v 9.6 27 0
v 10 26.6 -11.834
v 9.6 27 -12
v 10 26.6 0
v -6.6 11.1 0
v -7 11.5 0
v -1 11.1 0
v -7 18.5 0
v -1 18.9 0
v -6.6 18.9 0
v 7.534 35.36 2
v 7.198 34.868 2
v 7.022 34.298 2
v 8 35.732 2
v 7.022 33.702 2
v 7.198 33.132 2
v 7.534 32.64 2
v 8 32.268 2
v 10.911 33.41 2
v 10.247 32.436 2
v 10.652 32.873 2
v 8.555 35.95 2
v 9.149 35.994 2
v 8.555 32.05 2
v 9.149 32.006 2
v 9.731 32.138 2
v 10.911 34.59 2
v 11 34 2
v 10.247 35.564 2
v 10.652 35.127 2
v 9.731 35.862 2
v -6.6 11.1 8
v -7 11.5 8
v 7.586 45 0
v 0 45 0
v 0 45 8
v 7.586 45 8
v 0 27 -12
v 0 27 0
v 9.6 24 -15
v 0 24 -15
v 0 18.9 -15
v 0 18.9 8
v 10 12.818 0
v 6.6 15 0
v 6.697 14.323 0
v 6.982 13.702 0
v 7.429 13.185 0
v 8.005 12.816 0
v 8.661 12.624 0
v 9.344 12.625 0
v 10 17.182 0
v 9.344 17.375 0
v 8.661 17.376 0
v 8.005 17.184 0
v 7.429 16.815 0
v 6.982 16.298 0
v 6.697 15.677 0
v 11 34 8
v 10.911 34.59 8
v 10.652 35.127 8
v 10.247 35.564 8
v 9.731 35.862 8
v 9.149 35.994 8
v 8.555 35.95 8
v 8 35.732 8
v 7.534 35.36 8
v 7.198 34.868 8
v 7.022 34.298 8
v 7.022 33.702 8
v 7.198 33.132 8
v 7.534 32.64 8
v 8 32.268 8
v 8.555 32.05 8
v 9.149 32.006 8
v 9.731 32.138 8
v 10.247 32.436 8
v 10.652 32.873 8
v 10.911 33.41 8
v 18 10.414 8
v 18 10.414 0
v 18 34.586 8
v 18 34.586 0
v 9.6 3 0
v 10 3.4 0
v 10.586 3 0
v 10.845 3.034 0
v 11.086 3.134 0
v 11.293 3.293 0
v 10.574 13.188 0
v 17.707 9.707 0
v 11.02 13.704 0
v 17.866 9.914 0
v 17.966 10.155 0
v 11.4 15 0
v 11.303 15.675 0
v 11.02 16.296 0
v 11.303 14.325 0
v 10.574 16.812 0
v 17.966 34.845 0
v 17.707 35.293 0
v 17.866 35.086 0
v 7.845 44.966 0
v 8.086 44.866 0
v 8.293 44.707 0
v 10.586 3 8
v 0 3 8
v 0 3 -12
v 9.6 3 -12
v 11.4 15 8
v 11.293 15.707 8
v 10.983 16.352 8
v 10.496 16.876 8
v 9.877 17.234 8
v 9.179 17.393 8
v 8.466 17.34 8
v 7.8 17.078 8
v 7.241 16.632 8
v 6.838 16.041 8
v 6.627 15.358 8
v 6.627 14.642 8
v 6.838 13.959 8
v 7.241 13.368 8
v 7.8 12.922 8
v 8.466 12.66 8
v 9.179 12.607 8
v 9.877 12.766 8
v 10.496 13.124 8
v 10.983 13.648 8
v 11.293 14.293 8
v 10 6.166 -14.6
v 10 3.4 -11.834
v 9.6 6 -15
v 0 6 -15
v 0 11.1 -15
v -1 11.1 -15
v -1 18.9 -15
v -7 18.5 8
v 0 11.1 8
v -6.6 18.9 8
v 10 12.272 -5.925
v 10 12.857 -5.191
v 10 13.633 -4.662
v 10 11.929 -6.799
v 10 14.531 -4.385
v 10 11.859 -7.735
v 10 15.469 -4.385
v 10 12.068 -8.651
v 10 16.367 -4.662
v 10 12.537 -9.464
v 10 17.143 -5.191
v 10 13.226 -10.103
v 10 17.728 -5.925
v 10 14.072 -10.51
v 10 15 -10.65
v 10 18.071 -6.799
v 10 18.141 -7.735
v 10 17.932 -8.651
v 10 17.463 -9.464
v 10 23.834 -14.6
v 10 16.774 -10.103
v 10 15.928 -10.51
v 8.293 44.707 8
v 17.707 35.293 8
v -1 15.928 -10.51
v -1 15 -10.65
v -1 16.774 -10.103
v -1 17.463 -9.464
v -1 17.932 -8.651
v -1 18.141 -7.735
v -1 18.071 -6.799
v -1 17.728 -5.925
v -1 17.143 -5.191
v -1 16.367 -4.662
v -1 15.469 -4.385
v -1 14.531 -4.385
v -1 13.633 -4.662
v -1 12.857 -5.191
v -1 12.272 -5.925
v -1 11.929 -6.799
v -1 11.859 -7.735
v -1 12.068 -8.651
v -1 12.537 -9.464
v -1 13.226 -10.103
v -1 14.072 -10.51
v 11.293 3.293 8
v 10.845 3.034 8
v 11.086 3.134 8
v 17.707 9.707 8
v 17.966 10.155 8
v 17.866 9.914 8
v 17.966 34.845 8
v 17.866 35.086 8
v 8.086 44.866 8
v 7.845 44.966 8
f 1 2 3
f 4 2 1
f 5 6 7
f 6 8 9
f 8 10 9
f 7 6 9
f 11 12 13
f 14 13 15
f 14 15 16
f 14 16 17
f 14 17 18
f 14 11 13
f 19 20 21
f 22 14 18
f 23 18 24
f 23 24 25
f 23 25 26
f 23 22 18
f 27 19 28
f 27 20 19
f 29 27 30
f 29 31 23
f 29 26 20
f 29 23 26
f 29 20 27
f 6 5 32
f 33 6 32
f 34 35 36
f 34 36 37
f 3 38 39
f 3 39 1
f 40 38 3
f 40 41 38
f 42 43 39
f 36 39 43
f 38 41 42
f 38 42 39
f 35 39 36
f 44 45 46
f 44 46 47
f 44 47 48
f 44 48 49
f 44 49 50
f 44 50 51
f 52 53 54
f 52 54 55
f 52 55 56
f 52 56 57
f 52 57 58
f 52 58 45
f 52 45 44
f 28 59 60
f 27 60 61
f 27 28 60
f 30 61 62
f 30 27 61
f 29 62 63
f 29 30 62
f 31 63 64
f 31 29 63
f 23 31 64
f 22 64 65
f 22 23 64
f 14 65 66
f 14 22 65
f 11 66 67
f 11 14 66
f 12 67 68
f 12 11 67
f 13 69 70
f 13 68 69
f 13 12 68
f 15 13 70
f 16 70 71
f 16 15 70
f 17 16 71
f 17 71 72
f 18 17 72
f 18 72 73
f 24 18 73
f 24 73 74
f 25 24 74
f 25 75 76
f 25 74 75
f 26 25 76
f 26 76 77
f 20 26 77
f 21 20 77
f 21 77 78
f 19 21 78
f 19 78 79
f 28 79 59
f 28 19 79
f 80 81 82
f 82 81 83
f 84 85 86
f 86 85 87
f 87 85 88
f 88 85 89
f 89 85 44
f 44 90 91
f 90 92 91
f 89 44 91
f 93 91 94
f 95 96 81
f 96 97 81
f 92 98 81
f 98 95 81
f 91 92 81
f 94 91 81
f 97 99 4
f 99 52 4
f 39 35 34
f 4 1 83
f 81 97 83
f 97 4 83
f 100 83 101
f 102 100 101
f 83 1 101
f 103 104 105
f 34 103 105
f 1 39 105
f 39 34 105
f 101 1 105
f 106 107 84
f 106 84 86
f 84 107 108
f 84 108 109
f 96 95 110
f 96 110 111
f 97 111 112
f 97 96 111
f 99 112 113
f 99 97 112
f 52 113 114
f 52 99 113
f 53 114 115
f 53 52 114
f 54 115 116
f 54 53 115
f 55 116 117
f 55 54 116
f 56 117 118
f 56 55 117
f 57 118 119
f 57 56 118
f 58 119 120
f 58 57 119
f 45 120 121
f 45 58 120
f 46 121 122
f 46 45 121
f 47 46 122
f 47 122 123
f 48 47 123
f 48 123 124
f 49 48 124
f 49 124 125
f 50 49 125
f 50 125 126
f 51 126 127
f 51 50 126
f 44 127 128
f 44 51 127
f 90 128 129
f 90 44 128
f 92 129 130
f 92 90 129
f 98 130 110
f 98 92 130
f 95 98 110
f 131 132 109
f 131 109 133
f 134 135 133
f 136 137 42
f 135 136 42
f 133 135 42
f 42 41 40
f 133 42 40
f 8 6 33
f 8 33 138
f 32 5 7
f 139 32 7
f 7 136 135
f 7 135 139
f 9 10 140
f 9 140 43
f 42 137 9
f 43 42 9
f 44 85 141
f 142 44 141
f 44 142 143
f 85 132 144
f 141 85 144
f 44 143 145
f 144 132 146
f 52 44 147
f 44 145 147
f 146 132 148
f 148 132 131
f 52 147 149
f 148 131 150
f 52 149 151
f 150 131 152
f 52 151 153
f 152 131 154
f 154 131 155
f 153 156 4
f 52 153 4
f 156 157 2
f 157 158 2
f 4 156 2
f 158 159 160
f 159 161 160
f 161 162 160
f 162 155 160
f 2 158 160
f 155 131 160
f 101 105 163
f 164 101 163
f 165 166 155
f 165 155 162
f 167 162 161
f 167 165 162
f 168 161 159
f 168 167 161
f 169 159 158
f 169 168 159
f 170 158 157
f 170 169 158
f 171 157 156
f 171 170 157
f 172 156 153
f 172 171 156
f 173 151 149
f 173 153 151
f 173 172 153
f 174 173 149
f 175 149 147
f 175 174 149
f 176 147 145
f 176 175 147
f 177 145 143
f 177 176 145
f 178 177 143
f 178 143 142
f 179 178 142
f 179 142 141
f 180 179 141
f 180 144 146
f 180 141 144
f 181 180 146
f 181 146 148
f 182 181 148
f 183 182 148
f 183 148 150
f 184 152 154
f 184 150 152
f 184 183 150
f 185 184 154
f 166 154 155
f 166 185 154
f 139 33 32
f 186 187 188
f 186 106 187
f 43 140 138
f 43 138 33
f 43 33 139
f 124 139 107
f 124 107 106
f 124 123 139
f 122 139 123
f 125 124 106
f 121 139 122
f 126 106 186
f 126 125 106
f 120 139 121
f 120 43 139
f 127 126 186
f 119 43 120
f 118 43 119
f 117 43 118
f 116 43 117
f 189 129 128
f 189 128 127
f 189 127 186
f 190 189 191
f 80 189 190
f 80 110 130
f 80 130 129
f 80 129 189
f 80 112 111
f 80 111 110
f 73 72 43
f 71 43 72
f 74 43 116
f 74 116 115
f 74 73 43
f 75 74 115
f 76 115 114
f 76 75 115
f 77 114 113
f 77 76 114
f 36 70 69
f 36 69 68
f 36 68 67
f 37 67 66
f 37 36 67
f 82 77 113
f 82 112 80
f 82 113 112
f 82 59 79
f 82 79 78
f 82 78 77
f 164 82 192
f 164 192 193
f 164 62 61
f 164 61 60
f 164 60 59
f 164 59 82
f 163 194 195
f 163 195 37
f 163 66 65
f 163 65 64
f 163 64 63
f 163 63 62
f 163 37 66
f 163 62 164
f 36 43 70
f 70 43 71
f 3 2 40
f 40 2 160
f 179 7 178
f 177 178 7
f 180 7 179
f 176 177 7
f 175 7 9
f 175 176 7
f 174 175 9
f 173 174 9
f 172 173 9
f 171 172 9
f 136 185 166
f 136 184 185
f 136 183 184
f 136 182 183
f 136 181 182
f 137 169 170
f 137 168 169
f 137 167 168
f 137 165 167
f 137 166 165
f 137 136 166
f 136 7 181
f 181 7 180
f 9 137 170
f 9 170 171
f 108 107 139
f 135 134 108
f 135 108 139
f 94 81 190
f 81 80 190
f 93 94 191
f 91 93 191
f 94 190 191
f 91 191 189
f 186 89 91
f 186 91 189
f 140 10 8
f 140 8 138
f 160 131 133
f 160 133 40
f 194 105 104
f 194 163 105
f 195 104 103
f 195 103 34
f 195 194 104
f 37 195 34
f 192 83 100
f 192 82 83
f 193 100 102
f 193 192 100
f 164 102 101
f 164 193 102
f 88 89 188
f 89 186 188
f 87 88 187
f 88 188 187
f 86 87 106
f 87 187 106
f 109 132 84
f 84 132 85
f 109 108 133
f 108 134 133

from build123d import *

# Parameters (mm, degrees)
CYLINDER004_R     = 2.4
CYLINDER004_DEPTH = 35
CYLINDER011_R     = 2
CYLINDER011_DEPTH = 40
CYLINDER008_R     = 3.15
CYLINDER008_DEPTH = 16
BOX006_W          = 10
BOX006_H          = 24
BOX006_DEPTH      = 15
CHAMFER004_SIZE   = 3
CHAMFER017_SIZE   = 0.4
BOX004_W          = 7
BOX004_H          = 7.8
BOX004_DEPTH      = 8
CHAMFER010_SIZE   = 0.4
BOX003_W          = 18
BOX003_H          = 42
BOX003_DEPTH      = 8
CHAMFER_SIZE      = 7
CHAMFER015_SIZE   = 10
FILLET004_R       = 1
BOX_W             = 1
BOX_H             = 7.8
BOX_DEPTH         = 15


with BuildPart() as cylinder004:
    # Cylinder004 → Cylinder004 (new body)
    with BuildSketch(Plane(origin=(9, 15, 0), x_dir=(1, 0, 0), z_dir=(0, 0, 1))):
        Circle(CYLINDER004_R)
    extrude(amount=CYLINDER004_DEPTH)


with BuildPart() as cylinder011:
    # Cylinder011 → Cylinder011 (new body)
    with BuildSketch(Plane(origin=(9, 34, 2), x_dir=(1, 0, 0), z_dir=(0, 0, 1))):
        Circle(CYLINDER011_R)
    extrude(amount=CYLINDER011_DEPTH)


with BuildPart() as cylinder008:
    # Cylinder008 → Cylinder008 (new body)
    with BuildSketch(Plane(origin=(-2, 15, -7.5), x_dir=(0, 0, -1), z_dir=(1, 0, 0))):
        Circle(CYLINDER008_R)
    extrude(amount=CYLINDER008_DEPTH)


with BuildPart() as chamfer017:
    # Box006 → Box006 (new body)
    with BuildSketch(Plane(origin=(0, 3, -15), x_dir=(1, 0, 0), z_dir=(0, 0, 1))):
        with Locations((5, 12)):
            Rectangle(BOX006_W, BOX006_H)
    extrude(amount=BOX006_DEPTH)

    # Chamfer004
    chamfer004_edges = [chamfer017.edges().sort_by_distance(p)[0] for p in [
        (5, 3, -15),
        (5, 27, -15),
    ]]
    chamfer(chamfer004_edges, length=CHAMFER004_SIZE)

    # Chamfer017
    chamfer017_edges = [chamfer017.edges().sort_by_distance(p)[0] for p in [
        (10, 3, -6),
        (10, 4.5, -13.5),
        (10, 15, -15),
        (10, 27, -6),
        (10, 25.5, -13.5),
    ]]
    chamfer(chamfer017_edges, length=CHAMFER017_SIZE)


with BuildPart() as chamfer010:
    # Box004 → Box004 (new body)
    with BuildSketch(Plane(origin=(-7, 11.1, 0), x_dir=(1, 0, 0), z_dir=(0, 0, 1))):
        with Locations((3.5, 3.9)):
            Rectangle(BOX004_W, BOX004_H)
    extrude(amount=BOX004_DEPTH)

    # Chamfer010
    chamfer010_edges = [chamfer010.edges().sort_by_distance(p)[0] for p in [
        (-7, 11.1, 4),
        (-7, 18.9, 4),
    ]]
    chamfer(chamfer010_edges, length=CHAMFER010_SIZE)


with BuildPart() as fillet004:
    # Box003 → Box003 (new body)
    with BuildSketch(Plane(origin=(0, 3, 0), x_dir=(1, 0, 0), z_dir=(0, 0, 1))):
        with Locations((9, 21)):
            Rectangle(BOX003_W, BOX003_H)
    extrude(amount=BOX003_DEPTH)

    # Chamfer
    chamfer_edges = [fillet004.edges().sort_by_distance(p)[0] for p in [
        (18, 3, 4),
    ]]
    chamfer(chamfer_edges, length=CHAMFER_SIZE)

    # Chamfer015
    chamfer015_edges = [fillet004.edges().sort_by_distance(p)[0] for p in [
        (18, 45, 4),
    ]]
    chamfer(chamfer015_edges, length=CHAMFER015_SIZE)

    # Fillet004
    fillet004_edges = [fillet004.edges().sort_by_distance(p)[0] for p in [
        (18, 35, 4),
        (18, 10, 4),
        (8, 45, 4),
        (11, 3, 4),
    ]]
    fillet(fillet004_edges, radius=FILLET004_R)


with BuildPart() as cut002002002007:
    # Box → Box (new body)
    with BuildSketch(Plane(origin=(-1, 11.1, -15), x_dir=(1, 0, 0), z_dir=(0, 0, 1))):
        with Locations((0.5, 3.9)):
            Rectangle(BOX_W, BOX_H)
    extrude(amount=BOX_DEPTH)

    # Fusion006003: union Chamfer017, Chamfer010, Fillet004
    add(chamfer017.part)
    add(chamfer010.part)
    add(fillet004.part)

    # Cut002002002003: cut Cylinder008
    add(cylinder008.part, mode=Mode.SUBTRACT)

    # Cut002002002006: cut Cylinder011
    add(cylinder011.part, mode=Mode.SUBTRACT)

    # Cut002002002007: cut Cylinder004
    add(cylinder004.part, mode=Mode.SUBTRACT)


solid = cut002002002007.part
